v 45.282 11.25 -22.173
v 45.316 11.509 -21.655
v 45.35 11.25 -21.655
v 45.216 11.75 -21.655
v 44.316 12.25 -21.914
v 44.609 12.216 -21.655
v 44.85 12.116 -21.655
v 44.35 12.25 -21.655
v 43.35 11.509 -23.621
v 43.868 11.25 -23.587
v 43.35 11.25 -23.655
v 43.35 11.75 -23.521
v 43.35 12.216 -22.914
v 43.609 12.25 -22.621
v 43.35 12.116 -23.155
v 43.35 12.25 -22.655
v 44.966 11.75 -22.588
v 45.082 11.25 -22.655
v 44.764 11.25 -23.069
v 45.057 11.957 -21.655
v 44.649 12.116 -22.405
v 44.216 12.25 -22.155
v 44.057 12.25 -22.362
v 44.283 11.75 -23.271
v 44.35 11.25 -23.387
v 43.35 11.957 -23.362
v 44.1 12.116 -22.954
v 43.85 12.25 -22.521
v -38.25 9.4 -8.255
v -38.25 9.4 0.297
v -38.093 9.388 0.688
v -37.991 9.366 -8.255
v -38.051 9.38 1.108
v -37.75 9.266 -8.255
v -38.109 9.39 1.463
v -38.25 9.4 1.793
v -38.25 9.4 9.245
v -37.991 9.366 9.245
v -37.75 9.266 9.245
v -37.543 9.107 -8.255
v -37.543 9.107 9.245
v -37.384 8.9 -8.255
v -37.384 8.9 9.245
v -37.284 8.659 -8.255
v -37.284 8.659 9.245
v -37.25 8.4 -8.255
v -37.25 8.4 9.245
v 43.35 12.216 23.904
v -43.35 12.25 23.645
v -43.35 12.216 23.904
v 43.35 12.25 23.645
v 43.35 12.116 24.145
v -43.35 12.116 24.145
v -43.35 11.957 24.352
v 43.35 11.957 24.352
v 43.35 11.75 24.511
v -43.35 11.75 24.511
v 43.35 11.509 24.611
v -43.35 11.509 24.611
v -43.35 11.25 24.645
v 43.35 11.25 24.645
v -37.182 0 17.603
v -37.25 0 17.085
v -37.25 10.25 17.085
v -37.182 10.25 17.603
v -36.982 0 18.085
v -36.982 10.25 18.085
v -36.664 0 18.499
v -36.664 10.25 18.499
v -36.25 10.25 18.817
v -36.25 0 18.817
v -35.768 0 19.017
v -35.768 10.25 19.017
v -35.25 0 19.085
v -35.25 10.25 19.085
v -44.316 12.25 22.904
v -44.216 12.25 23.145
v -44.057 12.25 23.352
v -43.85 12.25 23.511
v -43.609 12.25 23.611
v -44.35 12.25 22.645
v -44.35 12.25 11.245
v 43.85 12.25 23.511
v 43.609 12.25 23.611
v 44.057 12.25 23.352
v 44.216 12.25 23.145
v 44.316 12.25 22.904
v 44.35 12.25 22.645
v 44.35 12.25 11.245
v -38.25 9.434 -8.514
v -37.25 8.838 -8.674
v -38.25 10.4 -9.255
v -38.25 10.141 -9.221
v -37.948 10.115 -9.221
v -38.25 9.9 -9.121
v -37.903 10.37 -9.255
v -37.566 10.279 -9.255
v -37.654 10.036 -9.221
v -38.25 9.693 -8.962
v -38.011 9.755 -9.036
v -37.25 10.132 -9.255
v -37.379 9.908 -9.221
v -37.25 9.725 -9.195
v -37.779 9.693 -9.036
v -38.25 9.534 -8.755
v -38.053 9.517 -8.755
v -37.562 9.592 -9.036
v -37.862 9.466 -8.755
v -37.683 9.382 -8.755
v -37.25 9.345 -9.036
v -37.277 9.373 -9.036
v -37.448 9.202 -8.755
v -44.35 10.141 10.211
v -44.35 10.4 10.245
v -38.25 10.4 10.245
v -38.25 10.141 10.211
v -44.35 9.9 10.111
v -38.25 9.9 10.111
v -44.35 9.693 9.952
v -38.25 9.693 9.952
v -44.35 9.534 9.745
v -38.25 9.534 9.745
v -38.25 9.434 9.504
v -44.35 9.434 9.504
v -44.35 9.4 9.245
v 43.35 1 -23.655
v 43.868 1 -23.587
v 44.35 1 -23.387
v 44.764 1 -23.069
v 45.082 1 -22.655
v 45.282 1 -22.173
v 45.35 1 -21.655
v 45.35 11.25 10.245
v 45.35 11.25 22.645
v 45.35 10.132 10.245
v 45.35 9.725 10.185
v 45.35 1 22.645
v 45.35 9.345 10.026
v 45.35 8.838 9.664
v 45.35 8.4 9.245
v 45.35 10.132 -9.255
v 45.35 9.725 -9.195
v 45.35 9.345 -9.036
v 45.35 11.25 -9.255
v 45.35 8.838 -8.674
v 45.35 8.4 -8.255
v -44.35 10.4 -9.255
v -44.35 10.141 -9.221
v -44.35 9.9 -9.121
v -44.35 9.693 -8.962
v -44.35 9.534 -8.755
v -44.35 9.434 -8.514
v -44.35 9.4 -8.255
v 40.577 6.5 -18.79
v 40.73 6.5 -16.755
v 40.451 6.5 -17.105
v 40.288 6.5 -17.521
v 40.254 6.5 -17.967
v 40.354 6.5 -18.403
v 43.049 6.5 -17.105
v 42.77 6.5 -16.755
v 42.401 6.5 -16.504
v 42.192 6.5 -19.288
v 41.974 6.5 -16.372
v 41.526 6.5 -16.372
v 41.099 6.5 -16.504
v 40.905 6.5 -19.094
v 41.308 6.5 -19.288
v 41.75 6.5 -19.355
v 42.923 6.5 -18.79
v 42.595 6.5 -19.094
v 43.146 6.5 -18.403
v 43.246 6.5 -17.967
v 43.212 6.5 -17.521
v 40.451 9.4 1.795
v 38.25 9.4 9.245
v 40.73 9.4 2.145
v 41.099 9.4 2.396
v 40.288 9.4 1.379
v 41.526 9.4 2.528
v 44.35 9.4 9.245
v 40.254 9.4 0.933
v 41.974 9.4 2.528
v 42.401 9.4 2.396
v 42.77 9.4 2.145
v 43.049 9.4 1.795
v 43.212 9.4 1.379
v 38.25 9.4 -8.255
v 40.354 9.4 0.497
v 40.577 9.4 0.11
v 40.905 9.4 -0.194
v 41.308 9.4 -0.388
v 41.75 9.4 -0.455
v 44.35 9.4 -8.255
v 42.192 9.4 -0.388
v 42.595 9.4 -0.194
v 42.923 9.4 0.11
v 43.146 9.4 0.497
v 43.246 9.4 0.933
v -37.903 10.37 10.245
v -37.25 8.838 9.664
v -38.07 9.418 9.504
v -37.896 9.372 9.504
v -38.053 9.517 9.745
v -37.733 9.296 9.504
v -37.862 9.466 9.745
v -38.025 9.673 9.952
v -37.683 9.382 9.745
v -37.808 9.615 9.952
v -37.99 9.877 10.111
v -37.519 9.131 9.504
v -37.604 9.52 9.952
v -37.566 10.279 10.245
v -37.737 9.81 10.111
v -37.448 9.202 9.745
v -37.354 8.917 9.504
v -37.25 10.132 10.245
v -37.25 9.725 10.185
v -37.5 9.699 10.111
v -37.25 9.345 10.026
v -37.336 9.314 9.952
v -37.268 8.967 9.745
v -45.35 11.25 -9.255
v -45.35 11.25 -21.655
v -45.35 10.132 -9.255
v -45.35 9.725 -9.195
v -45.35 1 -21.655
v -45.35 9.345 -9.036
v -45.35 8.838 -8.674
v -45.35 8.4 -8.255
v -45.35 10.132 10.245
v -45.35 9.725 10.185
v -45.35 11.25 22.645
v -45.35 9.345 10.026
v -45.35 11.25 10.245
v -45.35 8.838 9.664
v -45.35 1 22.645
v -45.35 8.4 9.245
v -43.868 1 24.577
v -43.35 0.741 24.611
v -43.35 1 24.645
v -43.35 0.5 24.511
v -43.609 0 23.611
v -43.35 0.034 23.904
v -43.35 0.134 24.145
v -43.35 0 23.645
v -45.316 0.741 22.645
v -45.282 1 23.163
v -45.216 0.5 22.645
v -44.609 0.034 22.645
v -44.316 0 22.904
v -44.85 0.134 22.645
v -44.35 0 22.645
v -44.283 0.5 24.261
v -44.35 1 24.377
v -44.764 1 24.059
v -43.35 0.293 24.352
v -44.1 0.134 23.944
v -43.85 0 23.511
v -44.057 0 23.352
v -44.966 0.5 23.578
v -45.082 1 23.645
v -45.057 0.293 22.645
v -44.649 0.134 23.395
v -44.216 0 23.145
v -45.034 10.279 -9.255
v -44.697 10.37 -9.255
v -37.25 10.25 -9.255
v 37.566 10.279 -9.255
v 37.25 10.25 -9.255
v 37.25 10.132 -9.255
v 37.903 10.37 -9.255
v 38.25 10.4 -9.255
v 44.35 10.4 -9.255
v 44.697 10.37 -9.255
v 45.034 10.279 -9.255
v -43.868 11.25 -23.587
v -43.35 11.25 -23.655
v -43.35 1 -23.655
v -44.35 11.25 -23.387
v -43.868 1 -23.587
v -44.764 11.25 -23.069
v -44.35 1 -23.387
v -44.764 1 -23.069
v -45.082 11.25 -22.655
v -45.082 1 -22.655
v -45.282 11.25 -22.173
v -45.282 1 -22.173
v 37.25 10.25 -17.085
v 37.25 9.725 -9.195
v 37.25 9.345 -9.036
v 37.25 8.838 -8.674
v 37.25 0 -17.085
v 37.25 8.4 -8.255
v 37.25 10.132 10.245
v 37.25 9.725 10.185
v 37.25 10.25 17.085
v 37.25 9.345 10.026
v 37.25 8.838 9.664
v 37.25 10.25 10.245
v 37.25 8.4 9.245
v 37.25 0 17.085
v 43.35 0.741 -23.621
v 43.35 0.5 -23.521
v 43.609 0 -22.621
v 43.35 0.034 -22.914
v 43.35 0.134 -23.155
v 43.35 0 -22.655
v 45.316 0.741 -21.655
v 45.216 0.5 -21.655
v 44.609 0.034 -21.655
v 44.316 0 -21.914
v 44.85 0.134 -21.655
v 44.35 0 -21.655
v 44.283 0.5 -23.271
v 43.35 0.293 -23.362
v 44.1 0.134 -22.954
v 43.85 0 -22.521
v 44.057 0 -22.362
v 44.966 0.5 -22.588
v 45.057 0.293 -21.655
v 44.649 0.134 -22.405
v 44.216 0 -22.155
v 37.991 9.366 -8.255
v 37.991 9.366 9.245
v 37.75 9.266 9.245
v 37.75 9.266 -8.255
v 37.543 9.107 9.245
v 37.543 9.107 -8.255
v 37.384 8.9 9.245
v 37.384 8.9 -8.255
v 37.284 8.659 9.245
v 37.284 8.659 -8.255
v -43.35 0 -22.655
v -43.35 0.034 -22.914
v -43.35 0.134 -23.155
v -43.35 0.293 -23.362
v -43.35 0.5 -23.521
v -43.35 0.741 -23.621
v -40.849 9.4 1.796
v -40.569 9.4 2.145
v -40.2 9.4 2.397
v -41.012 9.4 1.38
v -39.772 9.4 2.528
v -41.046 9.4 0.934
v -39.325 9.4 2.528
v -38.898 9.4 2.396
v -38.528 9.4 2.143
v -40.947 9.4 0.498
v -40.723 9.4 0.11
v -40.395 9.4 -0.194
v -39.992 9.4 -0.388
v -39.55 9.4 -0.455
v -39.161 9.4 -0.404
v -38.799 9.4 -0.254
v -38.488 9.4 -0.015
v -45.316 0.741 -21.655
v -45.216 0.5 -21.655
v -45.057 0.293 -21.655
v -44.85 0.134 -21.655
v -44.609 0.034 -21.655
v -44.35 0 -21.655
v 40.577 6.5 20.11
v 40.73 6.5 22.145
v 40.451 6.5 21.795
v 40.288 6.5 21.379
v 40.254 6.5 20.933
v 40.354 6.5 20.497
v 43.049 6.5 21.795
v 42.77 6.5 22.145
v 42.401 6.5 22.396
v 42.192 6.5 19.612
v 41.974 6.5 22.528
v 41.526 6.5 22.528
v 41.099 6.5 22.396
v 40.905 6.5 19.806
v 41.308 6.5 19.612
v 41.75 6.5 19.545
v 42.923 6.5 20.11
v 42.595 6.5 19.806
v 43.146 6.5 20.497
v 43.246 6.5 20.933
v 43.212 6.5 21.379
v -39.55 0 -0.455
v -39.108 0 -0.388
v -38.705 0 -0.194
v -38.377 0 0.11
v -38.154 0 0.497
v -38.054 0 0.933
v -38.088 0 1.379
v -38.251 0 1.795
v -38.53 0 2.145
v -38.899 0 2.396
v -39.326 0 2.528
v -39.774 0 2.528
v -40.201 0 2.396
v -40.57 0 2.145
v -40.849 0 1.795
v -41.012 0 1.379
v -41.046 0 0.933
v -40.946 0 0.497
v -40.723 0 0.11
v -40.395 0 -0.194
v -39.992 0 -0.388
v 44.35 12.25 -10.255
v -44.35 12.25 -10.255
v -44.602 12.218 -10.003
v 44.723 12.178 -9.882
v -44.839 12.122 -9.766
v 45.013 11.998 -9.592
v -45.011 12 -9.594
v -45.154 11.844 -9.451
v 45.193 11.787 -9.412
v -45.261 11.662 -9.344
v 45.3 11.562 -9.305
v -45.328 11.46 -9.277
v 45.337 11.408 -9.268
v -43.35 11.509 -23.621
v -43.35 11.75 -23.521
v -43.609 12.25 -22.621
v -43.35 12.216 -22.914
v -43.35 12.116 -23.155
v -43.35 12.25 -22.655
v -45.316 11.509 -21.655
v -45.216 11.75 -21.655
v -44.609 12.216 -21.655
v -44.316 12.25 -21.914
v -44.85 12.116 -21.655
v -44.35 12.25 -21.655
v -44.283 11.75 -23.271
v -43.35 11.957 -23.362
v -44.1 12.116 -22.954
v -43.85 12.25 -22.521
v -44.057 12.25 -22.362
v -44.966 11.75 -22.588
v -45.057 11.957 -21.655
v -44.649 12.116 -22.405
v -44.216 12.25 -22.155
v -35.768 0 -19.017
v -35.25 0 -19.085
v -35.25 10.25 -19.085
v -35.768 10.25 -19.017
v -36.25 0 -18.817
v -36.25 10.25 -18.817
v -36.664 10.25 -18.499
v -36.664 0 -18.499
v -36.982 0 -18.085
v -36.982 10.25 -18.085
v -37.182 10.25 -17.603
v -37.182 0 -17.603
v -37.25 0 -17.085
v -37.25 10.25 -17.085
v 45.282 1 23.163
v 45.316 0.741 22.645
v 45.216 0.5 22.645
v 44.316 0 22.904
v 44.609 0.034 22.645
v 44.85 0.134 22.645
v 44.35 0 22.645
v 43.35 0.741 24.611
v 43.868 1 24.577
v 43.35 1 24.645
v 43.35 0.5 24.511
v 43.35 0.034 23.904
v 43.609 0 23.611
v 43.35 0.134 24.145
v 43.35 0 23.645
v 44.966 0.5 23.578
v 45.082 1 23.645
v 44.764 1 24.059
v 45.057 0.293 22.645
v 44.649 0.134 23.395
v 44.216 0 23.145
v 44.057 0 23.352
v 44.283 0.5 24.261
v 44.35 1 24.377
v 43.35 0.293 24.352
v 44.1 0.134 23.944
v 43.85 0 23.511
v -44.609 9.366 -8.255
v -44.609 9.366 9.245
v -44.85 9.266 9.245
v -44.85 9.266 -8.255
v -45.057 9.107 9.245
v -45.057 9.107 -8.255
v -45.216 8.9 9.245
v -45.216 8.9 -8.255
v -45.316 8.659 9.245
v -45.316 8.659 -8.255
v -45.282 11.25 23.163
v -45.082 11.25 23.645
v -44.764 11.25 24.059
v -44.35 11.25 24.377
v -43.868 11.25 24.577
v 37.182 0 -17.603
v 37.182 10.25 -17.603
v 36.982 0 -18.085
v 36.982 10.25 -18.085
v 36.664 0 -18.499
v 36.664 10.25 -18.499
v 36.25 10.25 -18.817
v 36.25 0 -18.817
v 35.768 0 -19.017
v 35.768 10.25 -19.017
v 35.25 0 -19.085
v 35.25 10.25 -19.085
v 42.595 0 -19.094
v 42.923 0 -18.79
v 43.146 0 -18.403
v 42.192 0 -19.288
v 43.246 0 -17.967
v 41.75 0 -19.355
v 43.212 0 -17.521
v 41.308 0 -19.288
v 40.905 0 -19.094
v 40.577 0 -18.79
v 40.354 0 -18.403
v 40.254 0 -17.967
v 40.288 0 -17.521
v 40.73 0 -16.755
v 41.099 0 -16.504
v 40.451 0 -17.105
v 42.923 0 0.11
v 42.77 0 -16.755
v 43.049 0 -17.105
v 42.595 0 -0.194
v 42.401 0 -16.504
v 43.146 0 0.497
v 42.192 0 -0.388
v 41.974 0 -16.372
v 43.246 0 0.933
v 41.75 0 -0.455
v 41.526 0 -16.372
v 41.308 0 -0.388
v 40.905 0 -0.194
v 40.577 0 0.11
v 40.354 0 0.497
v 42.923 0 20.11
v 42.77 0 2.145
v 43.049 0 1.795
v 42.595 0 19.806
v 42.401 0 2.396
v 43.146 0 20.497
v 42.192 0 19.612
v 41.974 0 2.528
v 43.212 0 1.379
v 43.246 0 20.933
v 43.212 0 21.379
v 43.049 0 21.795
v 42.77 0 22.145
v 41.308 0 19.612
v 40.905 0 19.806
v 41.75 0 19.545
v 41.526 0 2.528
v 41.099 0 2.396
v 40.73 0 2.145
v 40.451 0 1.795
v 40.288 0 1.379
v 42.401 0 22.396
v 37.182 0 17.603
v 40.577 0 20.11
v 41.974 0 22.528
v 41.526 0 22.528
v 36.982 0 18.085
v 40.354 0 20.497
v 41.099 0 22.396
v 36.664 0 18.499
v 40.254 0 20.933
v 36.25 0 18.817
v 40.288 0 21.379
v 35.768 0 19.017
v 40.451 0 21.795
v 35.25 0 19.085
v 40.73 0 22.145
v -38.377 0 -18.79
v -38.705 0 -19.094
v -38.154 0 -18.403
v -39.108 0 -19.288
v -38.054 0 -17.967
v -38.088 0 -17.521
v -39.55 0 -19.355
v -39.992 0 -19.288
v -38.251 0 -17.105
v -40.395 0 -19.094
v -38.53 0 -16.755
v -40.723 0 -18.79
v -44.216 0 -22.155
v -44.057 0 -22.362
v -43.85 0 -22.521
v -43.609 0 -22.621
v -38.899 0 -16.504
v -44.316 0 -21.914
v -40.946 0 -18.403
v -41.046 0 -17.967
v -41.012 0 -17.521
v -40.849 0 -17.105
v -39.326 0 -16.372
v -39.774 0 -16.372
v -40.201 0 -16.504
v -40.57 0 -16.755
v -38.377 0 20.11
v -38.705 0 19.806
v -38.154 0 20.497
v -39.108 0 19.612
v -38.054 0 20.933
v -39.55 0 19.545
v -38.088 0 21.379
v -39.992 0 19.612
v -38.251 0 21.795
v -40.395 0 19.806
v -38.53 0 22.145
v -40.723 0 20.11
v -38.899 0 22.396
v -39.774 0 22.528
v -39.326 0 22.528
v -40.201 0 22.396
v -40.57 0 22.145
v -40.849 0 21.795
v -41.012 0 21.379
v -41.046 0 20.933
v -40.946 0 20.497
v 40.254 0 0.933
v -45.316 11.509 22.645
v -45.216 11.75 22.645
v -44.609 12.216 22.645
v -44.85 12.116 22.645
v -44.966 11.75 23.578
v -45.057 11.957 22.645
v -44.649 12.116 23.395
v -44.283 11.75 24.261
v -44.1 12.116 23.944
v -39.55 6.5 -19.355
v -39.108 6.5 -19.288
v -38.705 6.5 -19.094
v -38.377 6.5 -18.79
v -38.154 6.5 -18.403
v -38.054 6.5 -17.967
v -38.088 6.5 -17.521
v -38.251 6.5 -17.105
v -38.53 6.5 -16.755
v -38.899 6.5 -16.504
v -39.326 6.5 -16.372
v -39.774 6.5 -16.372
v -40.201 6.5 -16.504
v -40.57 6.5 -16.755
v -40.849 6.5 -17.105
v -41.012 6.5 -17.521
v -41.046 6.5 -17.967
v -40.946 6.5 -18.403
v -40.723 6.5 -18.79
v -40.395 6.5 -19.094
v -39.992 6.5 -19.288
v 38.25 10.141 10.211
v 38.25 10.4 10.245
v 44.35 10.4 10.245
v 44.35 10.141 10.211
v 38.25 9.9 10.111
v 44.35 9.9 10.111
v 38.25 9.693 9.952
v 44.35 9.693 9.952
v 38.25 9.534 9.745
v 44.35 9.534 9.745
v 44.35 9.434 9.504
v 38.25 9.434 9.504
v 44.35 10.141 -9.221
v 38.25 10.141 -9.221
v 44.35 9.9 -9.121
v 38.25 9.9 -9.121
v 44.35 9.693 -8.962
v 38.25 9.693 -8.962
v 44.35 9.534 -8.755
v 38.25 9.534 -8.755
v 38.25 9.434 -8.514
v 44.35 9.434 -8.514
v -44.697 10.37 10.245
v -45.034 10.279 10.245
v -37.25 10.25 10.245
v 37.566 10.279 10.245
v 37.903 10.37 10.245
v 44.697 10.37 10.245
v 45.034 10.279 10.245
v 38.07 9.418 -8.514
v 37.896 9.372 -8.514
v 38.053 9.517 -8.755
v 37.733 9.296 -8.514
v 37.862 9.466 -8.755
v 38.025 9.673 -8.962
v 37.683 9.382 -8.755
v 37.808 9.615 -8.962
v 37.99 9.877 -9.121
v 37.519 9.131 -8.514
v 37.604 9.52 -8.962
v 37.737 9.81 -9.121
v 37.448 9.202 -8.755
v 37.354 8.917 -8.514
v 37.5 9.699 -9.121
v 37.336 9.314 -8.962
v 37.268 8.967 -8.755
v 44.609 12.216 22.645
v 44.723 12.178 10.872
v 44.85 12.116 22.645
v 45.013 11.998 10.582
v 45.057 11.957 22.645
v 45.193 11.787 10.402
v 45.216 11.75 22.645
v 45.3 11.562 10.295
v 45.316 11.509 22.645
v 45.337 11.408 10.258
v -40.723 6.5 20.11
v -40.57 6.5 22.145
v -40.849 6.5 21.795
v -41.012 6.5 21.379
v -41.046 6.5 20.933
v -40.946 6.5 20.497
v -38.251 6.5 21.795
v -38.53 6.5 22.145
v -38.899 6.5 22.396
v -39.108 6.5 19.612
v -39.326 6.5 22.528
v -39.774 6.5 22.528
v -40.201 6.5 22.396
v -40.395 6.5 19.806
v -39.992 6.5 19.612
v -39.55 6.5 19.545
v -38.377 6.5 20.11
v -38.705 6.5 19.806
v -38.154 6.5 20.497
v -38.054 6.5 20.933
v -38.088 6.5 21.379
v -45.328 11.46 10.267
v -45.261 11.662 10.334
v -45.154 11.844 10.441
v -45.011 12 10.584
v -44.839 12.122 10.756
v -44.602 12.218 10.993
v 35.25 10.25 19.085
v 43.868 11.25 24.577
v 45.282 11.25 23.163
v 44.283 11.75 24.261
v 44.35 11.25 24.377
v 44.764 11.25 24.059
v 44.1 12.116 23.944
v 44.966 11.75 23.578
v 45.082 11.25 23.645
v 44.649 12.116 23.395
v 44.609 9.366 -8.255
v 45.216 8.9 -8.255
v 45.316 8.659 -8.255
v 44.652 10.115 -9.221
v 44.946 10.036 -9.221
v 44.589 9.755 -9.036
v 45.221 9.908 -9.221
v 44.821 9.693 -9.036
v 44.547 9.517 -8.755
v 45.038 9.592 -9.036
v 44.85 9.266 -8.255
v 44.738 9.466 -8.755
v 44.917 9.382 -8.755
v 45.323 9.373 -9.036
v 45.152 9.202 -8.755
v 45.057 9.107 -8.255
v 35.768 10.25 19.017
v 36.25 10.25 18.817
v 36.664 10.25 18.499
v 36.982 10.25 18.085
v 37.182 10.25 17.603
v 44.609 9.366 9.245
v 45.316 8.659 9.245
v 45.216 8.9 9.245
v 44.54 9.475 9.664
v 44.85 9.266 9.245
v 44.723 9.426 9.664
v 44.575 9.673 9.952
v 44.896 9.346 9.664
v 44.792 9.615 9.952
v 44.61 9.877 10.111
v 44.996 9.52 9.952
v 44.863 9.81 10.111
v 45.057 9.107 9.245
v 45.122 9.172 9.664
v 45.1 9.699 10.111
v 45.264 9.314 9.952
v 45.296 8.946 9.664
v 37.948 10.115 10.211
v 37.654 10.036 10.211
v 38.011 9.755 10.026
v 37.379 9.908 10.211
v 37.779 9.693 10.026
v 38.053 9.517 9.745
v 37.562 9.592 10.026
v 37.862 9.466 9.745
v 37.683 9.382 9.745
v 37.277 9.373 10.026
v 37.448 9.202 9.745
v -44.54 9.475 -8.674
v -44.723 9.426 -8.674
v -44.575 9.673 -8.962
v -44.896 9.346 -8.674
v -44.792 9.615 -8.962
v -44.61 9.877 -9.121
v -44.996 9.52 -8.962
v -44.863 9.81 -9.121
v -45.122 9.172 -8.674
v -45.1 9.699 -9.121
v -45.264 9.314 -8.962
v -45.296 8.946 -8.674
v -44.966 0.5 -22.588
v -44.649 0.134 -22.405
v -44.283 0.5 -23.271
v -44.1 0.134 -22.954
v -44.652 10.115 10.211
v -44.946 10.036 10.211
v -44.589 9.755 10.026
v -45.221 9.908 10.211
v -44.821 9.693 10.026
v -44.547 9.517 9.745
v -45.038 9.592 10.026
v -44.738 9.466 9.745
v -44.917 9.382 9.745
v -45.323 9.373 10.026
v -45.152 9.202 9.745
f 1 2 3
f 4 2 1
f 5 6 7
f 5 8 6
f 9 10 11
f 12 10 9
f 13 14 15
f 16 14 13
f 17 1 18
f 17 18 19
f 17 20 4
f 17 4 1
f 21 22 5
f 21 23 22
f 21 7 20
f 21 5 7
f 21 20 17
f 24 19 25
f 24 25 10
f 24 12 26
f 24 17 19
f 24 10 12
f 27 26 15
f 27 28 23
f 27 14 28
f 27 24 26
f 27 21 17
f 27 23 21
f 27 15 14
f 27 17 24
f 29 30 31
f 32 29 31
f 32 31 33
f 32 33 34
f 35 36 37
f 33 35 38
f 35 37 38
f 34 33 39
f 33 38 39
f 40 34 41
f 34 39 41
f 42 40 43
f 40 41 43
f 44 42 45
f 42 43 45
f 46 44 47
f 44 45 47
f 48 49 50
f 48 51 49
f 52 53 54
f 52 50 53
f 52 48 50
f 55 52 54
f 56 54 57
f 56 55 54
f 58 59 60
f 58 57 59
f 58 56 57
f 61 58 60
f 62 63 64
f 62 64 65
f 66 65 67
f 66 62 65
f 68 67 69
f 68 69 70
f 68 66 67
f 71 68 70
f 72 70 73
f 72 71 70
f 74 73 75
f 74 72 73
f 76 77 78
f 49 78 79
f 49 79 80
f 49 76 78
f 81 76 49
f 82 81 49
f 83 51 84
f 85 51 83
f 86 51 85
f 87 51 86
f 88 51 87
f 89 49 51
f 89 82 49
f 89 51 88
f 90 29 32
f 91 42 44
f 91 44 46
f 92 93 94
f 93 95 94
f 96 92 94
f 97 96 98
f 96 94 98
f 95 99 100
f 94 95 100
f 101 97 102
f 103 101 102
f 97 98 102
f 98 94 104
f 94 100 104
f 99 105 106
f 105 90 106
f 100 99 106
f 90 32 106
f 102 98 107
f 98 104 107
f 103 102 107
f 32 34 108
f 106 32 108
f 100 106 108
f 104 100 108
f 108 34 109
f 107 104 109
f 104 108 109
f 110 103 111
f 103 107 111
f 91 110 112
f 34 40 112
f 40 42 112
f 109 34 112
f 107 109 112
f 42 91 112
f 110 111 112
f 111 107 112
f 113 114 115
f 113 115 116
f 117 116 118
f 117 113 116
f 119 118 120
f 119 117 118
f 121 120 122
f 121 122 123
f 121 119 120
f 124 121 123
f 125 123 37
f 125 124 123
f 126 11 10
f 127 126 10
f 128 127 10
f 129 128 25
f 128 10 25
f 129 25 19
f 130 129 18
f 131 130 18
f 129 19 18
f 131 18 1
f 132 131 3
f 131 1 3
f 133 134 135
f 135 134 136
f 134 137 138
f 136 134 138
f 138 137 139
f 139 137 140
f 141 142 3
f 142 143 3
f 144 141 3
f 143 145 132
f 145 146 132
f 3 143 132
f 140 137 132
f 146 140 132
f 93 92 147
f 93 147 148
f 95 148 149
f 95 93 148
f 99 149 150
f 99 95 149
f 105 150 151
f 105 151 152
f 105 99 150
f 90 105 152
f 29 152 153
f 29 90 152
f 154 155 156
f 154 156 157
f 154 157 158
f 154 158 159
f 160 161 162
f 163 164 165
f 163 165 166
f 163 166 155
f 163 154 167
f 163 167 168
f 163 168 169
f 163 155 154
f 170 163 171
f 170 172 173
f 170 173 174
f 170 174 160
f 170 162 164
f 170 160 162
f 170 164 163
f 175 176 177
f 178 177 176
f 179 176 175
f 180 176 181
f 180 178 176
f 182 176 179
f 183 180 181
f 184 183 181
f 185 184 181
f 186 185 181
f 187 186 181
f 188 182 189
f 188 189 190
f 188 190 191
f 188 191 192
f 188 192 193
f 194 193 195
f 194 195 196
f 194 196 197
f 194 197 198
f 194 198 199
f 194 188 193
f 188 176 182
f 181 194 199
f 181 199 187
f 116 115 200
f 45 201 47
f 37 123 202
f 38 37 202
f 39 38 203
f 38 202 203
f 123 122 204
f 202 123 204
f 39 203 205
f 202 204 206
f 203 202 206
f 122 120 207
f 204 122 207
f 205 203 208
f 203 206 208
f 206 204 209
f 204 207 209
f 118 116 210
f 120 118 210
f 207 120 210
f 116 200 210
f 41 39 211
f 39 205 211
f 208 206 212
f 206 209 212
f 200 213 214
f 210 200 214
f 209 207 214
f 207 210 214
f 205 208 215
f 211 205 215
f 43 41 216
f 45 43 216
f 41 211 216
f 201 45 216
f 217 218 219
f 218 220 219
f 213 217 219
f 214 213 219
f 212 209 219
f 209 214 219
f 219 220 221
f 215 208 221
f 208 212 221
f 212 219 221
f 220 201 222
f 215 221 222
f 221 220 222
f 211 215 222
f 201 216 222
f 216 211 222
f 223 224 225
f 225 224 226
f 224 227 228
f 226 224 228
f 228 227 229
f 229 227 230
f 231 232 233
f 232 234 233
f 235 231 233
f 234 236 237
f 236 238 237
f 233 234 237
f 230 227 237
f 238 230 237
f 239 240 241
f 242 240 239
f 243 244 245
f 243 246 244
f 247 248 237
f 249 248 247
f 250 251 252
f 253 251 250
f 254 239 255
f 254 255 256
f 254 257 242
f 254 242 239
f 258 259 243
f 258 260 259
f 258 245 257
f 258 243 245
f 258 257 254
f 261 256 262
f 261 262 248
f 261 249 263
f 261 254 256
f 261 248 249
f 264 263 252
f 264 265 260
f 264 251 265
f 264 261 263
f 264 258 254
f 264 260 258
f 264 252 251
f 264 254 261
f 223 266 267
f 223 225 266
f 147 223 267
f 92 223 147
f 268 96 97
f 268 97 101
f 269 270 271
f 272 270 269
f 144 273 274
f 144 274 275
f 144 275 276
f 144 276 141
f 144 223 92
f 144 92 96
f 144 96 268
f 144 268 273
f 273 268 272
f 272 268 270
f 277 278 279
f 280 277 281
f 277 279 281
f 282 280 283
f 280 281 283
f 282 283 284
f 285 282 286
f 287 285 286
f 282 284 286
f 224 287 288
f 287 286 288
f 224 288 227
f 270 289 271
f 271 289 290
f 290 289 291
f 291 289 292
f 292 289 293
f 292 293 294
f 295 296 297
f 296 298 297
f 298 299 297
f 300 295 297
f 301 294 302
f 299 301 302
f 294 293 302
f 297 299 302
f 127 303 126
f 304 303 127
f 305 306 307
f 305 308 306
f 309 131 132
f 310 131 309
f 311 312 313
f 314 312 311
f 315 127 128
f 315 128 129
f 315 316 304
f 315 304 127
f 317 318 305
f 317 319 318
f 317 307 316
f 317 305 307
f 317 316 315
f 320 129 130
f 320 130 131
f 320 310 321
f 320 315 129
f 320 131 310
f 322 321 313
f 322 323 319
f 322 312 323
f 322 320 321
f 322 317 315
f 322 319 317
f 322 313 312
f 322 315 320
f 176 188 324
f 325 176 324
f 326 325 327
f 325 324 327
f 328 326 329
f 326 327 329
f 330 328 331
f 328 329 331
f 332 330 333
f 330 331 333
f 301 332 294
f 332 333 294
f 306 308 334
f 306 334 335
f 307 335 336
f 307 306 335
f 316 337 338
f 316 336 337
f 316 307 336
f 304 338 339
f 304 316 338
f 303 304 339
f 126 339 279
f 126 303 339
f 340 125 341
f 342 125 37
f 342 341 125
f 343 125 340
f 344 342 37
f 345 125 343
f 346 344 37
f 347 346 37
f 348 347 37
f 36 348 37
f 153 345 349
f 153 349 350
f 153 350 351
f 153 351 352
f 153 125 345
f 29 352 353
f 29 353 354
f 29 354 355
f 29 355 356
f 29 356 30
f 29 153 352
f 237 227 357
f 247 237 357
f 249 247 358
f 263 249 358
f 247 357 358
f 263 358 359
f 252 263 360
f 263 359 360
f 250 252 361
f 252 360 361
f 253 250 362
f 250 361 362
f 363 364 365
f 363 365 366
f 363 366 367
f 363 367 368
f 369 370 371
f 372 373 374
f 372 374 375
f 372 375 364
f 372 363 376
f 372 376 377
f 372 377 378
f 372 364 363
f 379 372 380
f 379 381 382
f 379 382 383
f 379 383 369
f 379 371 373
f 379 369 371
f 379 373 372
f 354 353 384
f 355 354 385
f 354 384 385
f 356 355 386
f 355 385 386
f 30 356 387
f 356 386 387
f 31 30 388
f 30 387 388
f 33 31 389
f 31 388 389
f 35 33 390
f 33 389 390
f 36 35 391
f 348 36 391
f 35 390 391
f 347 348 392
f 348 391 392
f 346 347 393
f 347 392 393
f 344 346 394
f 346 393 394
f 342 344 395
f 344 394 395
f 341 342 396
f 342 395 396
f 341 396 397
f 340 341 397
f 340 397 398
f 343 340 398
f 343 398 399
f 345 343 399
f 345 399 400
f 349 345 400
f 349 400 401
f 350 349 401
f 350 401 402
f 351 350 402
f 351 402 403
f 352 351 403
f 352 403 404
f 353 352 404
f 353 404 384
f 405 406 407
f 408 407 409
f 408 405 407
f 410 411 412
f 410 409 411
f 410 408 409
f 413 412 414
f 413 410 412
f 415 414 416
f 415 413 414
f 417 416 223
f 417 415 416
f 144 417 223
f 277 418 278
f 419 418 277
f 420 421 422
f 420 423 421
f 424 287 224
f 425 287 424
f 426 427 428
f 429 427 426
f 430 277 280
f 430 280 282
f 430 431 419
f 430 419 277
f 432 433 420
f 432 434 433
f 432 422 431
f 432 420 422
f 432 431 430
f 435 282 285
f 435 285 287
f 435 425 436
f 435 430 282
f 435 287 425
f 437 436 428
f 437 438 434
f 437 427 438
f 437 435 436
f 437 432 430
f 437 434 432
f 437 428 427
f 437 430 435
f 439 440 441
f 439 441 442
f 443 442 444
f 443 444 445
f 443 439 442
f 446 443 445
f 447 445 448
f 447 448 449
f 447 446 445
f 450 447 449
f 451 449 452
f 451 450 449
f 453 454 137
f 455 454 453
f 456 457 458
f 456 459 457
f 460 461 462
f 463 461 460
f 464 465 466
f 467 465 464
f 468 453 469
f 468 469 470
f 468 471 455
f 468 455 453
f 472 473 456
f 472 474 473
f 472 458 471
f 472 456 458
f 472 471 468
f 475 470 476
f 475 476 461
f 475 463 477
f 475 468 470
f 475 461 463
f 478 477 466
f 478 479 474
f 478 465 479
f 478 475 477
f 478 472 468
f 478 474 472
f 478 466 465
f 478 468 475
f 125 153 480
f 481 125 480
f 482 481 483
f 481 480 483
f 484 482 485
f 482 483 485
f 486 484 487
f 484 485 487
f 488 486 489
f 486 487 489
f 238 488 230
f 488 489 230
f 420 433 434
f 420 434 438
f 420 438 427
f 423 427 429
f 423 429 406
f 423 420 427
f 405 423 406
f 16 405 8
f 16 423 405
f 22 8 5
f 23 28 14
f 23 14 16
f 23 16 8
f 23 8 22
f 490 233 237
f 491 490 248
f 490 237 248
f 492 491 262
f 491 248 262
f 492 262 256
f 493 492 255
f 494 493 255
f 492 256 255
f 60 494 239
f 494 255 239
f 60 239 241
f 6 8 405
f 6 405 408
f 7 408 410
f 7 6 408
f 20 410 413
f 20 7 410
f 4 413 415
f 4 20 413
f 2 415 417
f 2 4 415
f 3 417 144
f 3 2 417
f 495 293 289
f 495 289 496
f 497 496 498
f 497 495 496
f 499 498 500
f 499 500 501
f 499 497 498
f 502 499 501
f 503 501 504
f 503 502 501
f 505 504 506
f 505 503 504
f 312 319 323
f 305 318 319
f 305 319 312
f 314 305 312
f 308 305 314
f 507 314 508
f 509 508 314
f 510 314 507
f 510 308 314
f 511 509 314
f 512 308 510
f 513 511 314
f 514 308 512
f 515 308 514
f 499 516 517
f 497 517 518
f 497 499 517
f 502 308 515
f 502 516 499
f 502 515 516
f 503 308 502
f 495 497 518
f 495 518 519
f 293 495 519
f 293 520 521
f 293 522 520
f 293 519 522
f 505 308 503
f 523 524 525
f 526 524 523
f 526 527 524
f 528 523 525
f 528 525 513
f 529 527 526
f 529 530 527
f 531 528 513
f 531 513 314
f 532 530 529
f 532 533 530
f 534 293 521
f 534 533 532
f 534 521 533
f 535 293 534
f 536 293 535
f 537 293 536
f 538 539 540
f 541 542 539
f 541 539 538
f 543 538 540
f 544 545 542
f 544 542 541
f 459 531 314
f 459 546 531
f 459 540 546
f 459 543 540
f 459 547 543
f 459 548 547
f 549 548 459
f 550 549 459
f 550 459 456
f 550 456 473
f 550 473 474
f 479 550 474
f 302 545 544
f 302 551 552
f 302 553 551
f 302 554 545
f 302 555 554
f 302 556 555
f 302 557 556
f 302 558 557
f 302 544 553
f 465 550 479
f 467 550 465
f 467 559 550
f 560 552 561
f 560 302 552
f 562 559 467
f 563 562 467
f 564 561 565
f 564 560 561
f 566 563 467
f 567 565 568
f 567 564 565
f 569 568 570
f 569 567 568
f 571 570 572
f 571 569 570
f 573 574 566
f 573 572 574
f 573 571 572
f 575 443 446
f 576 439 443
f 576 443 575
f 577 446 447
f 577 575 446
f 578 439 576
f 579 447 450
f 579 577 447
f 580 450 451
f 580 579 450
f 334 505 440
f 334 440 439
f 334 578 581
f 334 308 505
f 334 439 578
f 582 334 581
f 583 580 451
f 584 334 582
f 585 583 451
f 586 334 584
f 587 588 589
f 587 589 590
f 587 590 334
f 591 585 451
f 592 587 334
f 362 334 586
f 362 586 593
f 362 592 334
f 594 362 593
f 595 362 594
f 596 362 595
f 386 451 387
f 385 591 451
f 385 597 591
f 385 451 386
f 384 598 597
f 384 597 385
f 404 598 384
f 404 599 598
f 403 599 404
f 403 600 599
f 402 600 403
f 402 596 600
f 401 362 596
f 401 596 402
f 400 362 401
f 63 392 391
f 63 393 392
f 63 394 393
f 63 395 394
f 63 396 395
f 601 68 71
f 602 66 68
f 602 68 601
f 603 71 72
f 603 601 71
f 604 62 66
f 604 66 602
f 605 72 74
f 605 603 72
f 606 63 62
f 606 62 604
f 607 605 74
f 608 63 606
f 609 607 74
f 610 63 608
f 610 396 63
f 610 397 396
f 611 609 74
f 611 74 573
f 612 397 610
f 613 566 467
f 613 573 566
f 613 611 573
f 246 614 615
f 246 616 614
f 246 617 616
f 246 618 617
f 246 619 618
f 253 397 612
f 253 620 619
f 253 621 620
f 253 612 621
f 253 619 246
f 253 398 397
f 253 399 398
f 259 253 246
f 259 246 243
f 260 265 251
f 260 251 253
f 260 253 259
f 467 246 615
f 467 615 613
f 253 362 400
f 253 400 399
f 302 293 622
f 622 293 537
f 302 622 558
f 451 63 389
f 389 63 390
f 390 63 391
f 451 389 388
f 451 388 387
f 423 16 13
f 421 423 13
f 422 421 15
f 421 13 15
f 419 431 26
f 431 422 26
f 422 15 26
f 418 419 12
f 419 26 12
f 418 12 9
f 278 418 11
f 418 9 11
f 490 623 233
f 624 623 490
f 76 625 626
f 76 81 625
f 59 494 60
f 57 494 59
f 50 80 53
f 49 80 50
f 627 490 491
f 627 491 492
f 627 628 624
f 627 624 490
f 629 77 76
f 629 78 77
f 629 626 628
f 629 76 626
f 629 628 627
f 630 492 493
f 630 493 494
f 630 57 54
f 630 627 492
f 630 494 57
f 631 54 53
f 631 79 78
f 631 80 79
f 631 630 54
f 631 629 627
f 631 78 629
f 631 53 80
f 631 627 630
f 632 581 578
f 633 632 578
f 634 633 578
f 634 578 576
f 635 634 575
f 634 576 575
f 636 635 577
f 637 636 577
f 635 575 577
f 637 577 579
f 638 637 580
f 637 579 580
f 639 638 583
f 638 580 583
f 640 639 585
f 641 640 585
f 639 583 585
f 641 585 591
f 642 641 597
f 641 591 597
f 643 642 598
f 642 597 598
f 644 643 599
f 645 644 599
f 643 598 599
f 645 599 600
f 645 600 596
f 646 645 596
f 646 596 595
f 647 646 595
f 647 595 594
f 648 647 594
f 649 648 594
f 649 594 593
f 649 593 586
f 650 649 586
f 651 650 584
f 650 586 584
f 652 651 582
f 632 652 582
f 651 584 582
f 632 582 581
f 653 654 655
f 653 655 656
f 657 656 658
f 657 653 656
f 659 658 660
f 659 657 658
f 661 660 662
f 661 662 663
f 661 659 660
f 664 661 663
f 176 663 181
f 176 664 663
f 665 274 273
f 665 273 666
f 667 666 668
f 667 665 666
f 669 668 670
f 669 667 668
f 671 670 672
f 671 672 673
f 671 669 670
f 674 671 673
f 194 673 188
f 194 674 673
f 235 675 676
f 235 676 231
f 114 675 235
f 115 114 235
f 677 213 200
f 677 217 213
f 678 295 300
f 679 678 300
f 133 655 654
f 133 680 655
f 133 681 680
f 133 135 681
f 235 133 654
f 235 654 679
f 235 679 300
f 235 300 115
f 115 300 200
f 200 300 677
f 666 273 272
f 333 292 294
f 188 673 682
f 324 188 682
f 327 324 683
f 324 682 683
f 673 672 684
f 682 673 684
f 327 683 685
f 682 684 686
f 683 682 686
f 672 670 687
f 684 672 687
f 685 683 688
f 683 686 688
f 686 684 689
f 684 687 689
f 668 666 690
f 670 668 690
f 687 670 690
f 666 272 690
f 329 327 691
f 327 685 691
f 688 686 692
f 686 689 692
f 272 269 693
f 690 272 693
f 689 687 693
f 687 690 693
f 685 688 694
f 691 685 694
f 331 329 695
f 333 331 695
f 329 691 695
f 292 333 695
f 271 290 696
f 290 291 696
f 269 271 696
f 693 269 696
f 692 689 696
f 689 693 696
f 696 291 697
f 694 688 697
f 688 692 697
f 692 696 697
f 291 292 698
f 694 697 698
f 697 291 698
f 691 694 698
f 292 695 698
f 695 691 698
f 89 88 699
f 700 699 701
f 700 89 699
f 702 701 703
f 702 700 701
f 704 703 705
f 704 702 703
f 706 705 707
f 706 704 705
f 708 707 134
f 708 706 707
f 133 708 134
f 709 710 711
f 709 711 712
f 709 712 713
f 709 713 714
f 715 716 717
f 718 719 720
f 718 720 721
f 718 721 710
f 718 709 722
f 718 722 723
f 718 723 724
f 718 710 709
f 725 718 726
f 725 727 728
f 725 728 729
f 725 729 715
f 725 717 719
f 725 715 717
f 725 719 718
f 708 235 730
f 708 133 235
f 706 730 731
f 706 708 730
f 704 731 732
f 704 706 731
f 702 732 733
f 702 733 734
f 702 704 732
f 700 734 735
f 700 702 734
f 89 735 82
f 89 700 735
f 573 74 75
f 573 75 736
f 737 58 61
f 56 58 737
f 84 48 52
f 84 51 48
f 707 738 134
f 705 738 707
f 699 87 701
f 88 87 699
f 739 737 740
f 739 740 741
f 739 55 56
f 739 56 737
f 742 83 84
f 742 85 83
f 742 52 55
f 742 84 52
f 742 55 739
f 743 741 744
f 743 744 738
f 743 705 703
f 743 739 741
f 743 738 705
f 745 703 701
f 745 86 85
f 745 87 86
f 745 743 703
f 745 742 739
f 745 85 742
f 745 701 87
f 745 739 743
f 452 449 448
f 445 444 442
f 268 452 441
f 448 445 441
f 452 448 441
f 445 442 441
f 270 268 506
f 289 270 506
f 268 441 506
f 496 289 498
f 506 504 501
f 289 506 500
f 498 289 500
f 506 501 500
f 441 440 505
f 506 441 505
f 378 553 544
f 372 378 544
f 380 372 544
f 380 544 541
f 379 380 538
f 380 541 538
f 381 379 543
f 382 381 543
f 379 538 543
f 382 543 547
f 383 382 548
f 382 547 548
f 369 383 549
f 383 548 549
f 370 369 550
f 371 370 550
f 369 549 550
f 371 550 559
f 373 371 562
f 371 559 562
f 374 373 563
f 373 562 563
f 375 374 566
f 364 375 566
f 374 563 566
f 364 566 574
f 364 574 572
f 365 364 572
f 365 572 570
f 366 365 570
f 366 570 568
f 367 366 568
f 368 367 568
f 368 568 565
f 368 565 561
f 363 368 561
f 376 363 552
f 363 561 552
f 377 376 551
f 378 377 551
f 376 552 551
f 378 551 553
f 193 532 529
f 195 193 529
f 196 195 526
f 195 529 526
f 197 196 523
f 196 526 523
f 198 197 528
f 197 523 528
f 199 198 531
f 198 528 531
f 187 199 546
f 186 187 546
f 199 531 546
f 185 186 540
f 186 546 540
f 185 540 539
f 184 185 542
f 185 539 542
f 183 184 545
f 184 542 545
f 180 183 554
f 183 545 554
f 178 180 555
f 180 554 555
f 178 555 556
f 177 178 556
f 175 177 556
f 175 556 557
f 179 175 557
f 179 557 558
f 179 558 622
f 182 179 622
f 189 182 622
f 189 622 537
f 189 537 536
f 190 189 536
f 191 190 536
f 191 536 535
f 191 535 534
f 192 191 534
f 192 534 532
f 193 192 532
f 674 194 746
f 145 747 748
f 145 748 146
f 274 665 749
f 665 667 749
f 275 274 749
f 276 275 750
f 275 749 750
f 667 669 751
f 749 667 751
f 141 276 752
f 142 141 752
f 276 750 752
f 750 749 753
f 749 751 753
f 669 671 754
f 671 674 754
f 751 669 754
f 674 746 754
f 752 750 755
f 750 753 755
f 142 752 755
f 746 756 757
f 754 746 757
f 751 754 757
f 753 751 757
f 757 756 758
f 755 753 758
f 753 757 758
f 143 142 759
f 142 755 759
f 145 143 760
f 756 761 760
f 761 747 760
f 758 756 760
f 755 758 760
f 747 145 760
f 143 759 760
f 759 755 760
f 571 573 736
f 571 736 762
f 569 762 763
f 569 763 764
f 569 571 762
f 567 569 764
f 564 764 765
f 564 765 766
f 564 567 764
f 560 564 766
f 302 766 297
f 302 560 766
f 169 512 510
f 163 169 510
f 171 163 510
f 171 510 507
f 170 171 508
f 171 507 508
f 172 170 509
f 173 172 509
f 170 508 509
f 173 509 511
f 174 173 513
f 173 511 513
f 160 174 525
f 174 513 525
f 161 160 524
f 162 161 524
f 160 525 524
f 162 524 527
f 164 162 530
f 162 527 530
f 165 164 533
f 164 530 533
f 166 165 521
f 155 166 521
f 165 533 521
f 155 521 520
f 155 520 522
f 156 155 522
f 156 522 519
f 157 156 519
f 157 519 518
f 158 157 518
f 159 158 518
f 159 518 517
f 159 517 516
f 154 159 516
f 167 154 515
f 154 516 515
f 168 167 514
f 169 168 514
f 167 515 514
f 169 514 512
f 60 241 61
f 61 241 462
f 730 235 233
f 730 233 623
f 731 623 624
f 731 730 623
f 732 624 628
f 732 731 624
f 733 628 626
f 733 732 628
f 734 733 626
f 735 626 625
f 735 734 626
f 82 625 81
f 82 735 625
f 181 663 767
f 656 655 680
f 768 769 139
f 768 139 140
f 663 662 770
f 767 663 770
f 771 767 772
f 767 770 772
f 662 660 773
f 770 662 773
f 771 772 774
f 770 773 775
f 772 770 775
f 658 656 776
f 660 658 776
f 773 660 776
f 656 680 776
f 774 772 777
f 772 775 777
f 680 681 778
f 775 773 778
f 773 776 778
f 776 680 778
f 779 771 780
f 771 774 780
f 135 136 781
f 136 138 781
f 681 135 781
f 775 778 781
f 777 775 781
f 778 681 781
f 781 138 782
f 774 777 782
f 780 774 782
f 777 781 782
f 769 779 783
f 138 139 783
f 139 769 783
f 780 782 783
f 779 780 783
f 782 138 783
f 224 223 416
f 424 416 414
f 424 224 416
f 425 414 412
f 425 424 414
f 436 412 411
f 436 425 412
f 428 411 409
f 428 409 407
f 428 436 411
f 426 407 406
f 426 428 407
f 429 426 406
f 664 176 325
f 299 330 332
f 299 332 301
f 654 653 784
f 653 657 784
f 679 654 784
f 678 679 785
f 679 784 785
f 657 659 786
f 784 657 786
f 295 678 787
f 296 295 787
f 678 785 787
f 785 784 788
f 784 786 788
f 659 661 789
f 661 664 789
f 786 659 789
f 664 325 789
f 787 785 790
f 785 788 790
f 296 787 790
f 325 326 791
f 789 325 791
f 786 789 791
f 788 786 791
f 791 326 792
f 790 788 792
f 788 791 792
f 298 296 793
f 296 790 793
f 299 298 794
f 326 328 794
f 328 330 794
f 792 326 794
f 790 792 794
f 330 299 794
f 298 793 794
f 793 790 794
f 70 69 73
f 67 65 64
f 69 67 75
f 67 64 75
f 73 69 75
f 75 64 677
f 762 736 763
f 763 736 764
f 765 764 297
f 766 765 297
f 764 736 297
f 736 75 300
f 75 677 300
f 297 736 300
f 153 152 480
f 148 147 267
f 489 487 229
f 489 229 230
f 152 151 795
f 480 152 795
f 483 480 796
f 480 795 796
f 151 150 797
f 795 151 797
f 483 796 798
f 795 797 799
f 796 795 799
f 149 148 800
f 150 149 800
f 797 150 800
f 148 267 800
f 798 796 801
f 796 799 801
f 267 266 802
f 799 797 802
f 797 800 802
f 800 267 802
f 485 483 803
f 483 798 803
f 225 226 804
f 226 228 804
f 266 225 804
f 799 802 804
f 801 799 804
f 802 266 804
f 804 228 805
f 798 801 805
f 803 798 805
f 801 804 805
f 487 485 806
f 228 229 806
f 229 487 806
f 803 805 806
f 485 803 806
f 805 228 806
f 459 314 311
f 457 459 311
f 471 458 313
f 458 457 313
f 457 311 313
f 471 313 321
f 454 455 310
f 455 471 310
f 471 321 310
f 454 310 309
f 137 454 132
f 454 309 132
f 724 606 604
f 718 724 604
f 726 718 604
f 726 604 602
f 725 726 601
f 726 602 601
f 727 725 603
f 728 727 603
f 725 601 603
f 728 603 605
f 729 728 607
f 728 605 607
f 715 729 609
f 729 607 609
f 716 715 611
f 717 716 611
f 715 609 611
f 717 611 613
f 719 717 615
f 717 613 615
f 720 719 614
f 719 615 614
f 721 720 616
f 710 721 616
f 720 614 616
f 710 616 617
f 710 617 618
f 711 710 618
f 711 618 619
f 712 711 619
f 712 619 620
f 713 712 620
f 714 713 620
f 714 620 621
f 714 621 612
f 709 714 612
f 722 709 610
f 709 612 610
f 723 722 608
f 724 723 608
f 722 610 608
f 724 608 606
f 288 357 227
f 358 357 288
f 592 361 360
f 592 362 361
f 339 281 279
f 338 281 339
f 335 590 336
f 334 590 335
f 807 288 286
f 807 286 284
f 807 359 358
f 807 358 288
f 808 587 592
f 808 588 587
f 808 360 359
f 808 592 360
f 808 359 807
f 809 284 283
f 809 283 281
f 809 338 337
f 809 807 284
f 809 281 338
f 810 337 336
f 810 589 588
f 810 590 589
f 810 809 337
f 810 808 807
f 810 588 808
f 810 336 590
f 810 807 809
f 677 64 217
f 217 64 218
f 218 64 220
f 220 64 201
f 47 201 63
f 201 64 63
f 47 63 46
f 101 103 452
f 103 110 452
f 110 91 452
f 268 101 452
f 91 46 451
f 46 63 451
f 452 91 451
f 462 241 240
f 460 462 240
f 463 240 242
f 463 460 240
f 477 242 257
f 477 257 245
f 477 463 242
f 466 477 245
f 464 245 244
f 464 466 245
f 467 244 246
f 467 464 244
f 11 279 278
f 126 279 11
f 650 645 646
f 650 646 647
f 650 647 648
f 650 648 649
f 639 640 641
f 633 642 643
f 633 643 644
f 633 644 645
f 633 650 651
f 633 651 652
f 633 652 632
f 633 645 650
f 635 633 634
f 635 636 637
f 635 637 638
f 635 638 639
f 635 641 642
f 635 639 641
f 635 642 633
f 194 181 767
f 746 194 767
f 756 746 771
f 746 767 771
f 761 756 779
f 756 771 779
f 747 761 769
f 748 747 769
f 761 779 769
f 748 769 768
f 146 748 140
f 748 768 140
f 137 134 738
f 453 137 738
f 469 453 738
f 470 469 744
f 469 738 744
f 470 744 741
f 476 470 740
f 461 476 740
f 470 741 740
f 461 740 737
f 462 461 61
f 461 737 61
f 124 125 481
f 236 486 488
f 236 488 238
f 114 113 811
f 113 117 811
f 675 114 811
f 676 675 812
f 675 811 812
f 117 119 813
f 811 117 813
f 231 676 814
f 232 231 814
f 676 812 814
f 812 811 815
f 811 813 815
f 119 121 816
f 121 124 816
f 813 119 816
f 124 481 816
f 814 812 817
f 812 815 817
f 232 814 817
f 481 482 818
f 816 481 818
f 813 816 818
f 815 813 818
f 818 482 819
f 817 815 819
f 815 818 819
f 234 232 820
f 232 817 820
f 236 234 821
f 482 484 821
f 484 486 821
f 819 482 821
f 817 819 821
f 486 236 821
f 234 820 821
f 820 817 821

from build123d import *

# Parameters (mm, degrees)
SKETCH1_W           = 90.7
SKETCH1_H           = 48.3
SKETCH1_W_2         = 74.5
SKETCH1_H_2         = 38.17
BOSS_EXTRUDE1_DEPTH = 12.25
SKETCH2_W           = 90.7
SKETCH2_H           = 14.4
BOSS_EXTRUDE2_DEPTH = 2
SKETCH3_W           = 8.1
SKETCH3_H           = 19.5
CUT_EXTRUDE1_DEPTH  = 2.85
SKETCH4_R           = 1.5
CUT_EXTRUDE2_DEPTH  = 6.5
SKETCH5_R           = 1.5
CUT_EXTRUDE3_DEPTH  = 54.047724032
FILLET7_R           = 1
FILLET4_R           = 2
FILLET5_R           = 1
FILLET8_R           = 1


with BuildPart() as part:
    # Sketch1 → Boss-Extrude1 (new body)
    with BuildSketch(Plane(origin=(0, 0, 0), x_dir=(1, 0, 0), z_dir=(0, 1, 0))):
        with Locations((0, -0.495)):
            Rectangle(SKETCH1_W, SKETCH1_H)
        Rectangle(SKETCH1_W_2, SKETCH1_H_2, mode=Mode.SUBTRACT)
    extrude(amount=BOSS_EXTRUDE1_DEPTH)

    # Sketch2 → Boss-Extrude2 (add)
    with BuildSketch(Plane(origin=(0, 12.25, 0), x_dir=(1, 0, 0), z_dir=(0, 1, 0))):
        with Locations((0, 16.455)):
            Rectangle(SKETCH2_W, SKETCH2_H)
        with Locations((0, -17.445)):
            Rectangle(SKETCH2_W, SKETCH2_H)
    extrude(amount=-BOSS_EXTRUDE2_DEPTH)

    # Sketch3 → Cut-Extrude1 (cut)
    with BuildSketch(Plane(origin=(0, 12.25, 0), x_dir=(1, 0, 0), z_dir=(0, 1, 0))):
        with Locations((-41.3, -0.495)):
            Rectangle(SKETCH3_W, SKETCH3_H)
        with Locations((41.3, -0.495)):
            Rectangle(SKETCH3_W, SKETCH3_H)
    extrude(amount=-CUT_EXTRUDE1_DEPTH, mode=Mode.SUBTRACT)

    # Sketch4 → Cut-Extrude2 (cut)
    with BuildSketch(Plane.XZ):
        with Locations(Location((-39.55, 21.045, 0), (0, 0, 270))):
            Circle(SKETCH4_R)
        with Locations(Location((41.75, 21.045, 0), (0, 0, 270))):
            Circle(SKETCH4_R)
        with Locations(Location((41.75, -17.855, 0), (0, 0, 270))):
            Circle(SKETCH4_R)
        with Locations(Location((-39.55, -17.855, 0), (0, 0, 270))):
            Circle(SKETCH4_R)
    extrude(amount=-CUT_EXTRUDE2_DEPTH, mode=Mode.SUBTRACT)

    # Sketch5 → Cut-Extrude3 (cut, through all)
    with BuildSketch(Plane.XZ):
        with Locations(Location((-39.55, 1.045, 0), (0, 0, 270))):
            Circle(SKETCH5_R)
        with Locations(Location((41.75, 1.045, 0), (0, 0, 270))):
            Circle(SKETCH5_R)
    extrude(amount=-CUT_EXTRUDE3_DEPTH, mode=Mode.SUBTRACT)

    # Fillet7
    fillet7_edges = [part.edges().sort_by_distance(p)[0] for p in [
        (45.35, 12.25, 17.445),
        (0, 12.25, -23.655),
        (-45.35, 12.25, -16.455),
        (0, 0, -23.655),
        (0, 12.25, -9.255),
        (45.35, 0, 0.495),
        (0, 0, 24.645),
        (0, 12.25, 10.245),
        (-45.35, 0, 0.495),
        (45.35, 12.25, -16.455),
        (-45.35, 12.25, 17.445),
        (0, 12.25, 24.645),
    ]]
    fillet(fillet7_edges, radius=FILLET7_R)

    # Fillet4
    # the kernel refuses this fillet: 2 mm, written as the material it adds along each edge
    with BuildSketch(Plane(origin=(-37.25, 0, 19.085), x_dir=(0, 0, -1), z_dir=(0, 1, 0)), Plane(origin=(37.25, 0, -19.085), x_dir=(0, 0, 1), z_dir=(0, 1, 0))) as fillet4_piece_1:
        with BuildLine():
            CenterArc((FILLET4_R, -FILLET4_R), FILLET4_R, 90, 90)
            Line((0, -FILLET4_R), (0, 0))
            Line((0, 0), (FILLET4_R, 0))
        make_face()
    extrude(amount=10.25)
    with BuildSketch(Plane(origin=(37.25, 0, 19.085), x_dir=(0, 0, -1), z_dir=(0, 1, 0)), Plane(origin=(-37.25, 0, -19.085), x_dir=(0, 0, 1), z_dir=(0, 1, 0))) as fillet4_piece_2:
        with BuildLine():
            CenterArc((FILLET4_R, FILLET4_R), FILLET4_R, 180, 90)
            Line((0, FILLET4_R), (0, 0))
            Line((0, 0), (FILLET4_R, 0))
        make_face()
    extrude(amount=10.25)
    # the kernel refuses this fillet: 2 mm, written as the material it takes off along each edge
    with BuildSketch(Plane(origin=(-43.35, 12.25, 22.645), x_dir=(-1, 0, 0), z_dir=(0, 0, -1))) as fillet4_2_piece_1:
        with BuildLine():
            CenterArc((1, -1), 1, 0, 90)
            Line((2, -1), (2, 0))
            Line((2, 0), (1, 0))
        make_face()
    revolve(axis=Axis((-43.35, 12.25, 22.645), (0, 1, 0)), revolution_arc=90, mode=Mode.SUBTRACT)
    with BuildSketch(Plane(origin=(43.35, 12.25, 22.645), x_dir=(0, 0, 1), z_dir=(-1, 0, 0))) as fillet4_2_piece_2:
        with BuildLine():
            CenterArc((1, -1), 1, 0, 90)
            Line((2, -1), (2, 0))
            Line((2, 0), (1, 0))
        make_face()
    revolve(axis=Axis((43.35, 12.25, 22.645), (0, 1, 0)), revolution_arc=90, mode=Mode.SUBTRACT)
    with BuildSketch(Plane(origin=(-43.35, 12.25, -21.655), x_dir=(0, 0, -1), z_dir=(1, 0, 0))) as fillet4_2_piece_3:
        with BuildLine():
            CenterArc((1, -1), 1, 0, 90)
            Line((2, -1), (2, 0))
            Line((2, 0), (1, 0))
        make_face()
    revolve(axis=Axis((-43.35, 12.25, -21.655), (0, 1, 0)), revolution_arc=90, mode=Mode.SUBTRACT)
    with BuildSketch(Plane(origin=(43.35, 12.25, -21.655), x_dir=(1, 0, 0), z_dir=(0, 0, 1))) as fillet4_2_piece_4:
        with BuildLine():
            CenterArc((1, -1), 1, 0, 90)
            Line((2, -1), (2, 0))
            Line((2, 0), (1, 0))
        make_face()
    revolve(axis=Axis((43.35, 12.25, -21.655), (0, 1, 0)), revolution_arc=90, mode=Mode.SUBTRACT)
    with BuildSketch(Plane(origin=(-43.35, 0, -21.655), x_dir=(-1, 0, 0), z_dir=(0, 0, 1))) as fillet4_2_piece_5:
        with BuildLine():
            CenterArc((1, -1), 1, 0, 90)
            Line((2, -1), (2, 0))
            Line((2, 0), (1, 0))
        make_face()
    revolve(axis=Axis((-43.35, 0, -21.655), (0, -1, 0)), revolution_arc=90, mode=Mode.SUBTRACT)
    with BuildSketch(Plane(origin=(43.35, 0, -21.655), x_dir=(0, 0, -1), z_dir=(-1, 0, 0))) as fillet4_2_piece_6:
        with BuildLine():
            CenterArc((1, -1), 1, 0, 90)
            Line((2, -1), (2, 0))
            Line((2, 0), (1, 0))
        make_face()
    revolve(axis=Axis((43.35, 0, -21.655), (0, -1, 0)), revolution_arc=90, mode=Mode.SUBTRACT)
    with BuildSketch(Plane(origin=(-43.35, 0, 22.645), x_dir=(0, 0, 1), z_dir=(1, 0, 0))) as fillet4_2_piece_7:
        with BuildLine():
            CenterArc((1, -1), 1, 0, 90)
            Line((2, -1), (2, 0))
            Line((2, 0), (1, 0))
        make_face()
    revolve(axis=Axis((-43.35, 0, 22.645), (0, -1, 0)), revolution_arc=90, mode=Mode.SUBTRACT)
    with BuildSketch(Plane(origin=(43.35, 0, 22.645), x_dir=(1, 0, 0), z_dir=(0, 0, -1))) as fillet4_2_piece_8:
        with BuildLine():
            CenterArc((1, -1), 1, 0, 90)
            Line((2, -1), (2, 0))
            Line((2, 0), (1, 0))
        make_face()
    revolve(axis=Axis((43.35, 0, 22.645), (0, -1, 0)), revolution_arc=90, mode=Mode.SUBTRACT)
    with BuildSketch(Plane(origin=(45.35, 12.25, 24.645), x_dir=(0, 0, -1), z_dir=(0, -1, 0)), Plane(origin=(45.35, 12.25, -23.655), x_dir=(-1, 0, 0), z_dir=(0, -1, 0)), Plane(origin=(-45.35, 0, 24.645), x_dir=(0, 0, -1), z_dir=(0, 1, 0)), Plane(origin=(-45.35, 0, -23.655), x_dir=(1, 0, 0), z_dir=(0, 1, 0))) as fillet4_2_piece_9:
        with BuildLine():
            CenterArc((FILLET4_R, -FILLET4_R), FILLET4_R, 90, 90)
            Line((0, -FILLET4_R), (0, 0))
            Line((0, 0), (FILLET4_R, 0))
        make_face()
    extrude(amount=12.25, mode=Mode.SUBTRACT)

    # Fillet5
    # the kernel refuses this fillet: 1 mm, written as the material it takes off along each edge
    with BuildSketch(Plane(origin=(-45.35, 9.4, -9.255), x_dir=(0, -1, 0), z_dir=(0, 0, 1)), Plane(origin=(-37.25, 9.4, 10.245), x_dir=(0, -1, 0), z_dir=(0, 0, -1)), Plane(origin=(37.25, 9.4, -9.255), x_dir=(0, -1, 0), z_dir=(0, 0, 1))) as fillet5_piece_1:
        with BuildLine():
            CenterArc((FILLET5_R, FILLET5_R), FILLET5_R, 180, 90)
            Line((0, FILLET5_R), (0, 0))
            Line((0, 0), (FILLET5_R, 0))
        make_face()
    extrude(amount=19.5, mode=Mode.SUBTRACT)
    with BuildSketch(Plane(origin=(45.35, 9.4, 10.245), x_dir=(-1, 0, 0), z_dir=(0, 0, -1))) as fillet5_piece_2:
        with BuildLine():
            CenterArc((FILLET5_R, -FILLET5_R), FILLET5_R, 90, 90)
            Line((0, -FILLET5_R), (0, 0))
            Line((0, 0), (FILLET5_R, 0))
        make_face()
    extrude(amount=19.5, mode=Mode.SUBTRACT)

    # Fillet8
    # the kernel refuses this fillet: 1 mm, written as the material it adds along each edge
    with BuildSketch(Plane(origin=(44.35, 9.4, -9.255), x_dir=(0, 1, 0), z_dir=(-1, 0, 0)), Plane(origin=(38.25, 9.4, 10.245), x_dir=(0, 1, 0), z_dir=(1, 0, 0)), Plane(origin=(-44.35, 9.4, 10.245), x_dir=(0, 1, 0), z_dir=(1, 0, 0)), Plane(origin=(-38.25, 9.4, -9.255), x_dir=(0, 1, 0), z_dir=(-1, 0, 0))) as fillet8_piece_1:
        with BuildLine():
            CenterArc((FILLET8_R, -FILLET8_R), FILLET8_R, 90, 90)
            Line((0, -FILLET8_R), (0, 0))
            Line((0, 0), (FILLET8_R, 0))
        make_face()
    extrude(amount=6.1)
    with BuildSketch(Plane(origin=(44.35, 8.4, -9.255), x_dir=(0, 1, 0), z_dir=(-1, 0, 0))) as fillet8_piece_2_section:
        with BuildLine():
            CenterArc((1 + FILLET8_R, -FILLET8_R), FILLET8_R, 90, 90)
            Line((1, -FILLET8_R), (1, 0))
            Line((1, 0), (1 + FILLET8_R, 0))
        make_face()
    fillet8_piece_2 = revolve(axis=Axis((44.35, 8.4, -9.255), (0, 0, -1)), revolution_arc=233.296989237, mode=Mode.PRIVATE)
    fillet8_piece_2 = split(fillet8_piece_2, bisect_by=Plane(origin=(45.35, 9.619775247, -9.087699795), z_dir=(-1, 0, 0)), keep=Keep.TOP, mode=Mode.PRIVATE)
    add(fillet8_piece_2)
    with BuildSketch(Plane(origin=(44.35, 8.4, 10.245), x_dir=(0, 1, 0), z_dir=(-1, 0, 0))) as fillet8_piece_3_section:
        with BuildLine():
            CenterArc((1 + FILLET8_R, FILLET8_R), FILLET8_R, 180, 90)
            Line((1, FILLET8_R), (1, 0))
            Line((1, 0), (1 + FILLET8_R, 0))
        make_face()
    fillet8_piece_3 = revolve(axis=Axis((44.35, 8.4, 10.245), (0, 0, -1)), revolution_arc=233.296989237, mode=Mode.PRIVATE)
    fillet8_piece_3 = split(fillet8_piece_3, bisect_by=Plane(origin=(45.35, 9.619775247, 10.077699795), z_dir=(-1, 0, 0)), keep=Keep.TOP, mode=Mode.PRIVATE)
    add(fillet8_piece_3)
    with BuildSketch(Plane(origin=(38.25, 8.4, 10.245), x_dir=(0, 1, 0), z_dir=(1, 0, 0))) as fillet8_piece_4_section:
        with BuildLine():
            CenterArc((1 + FILLET8_R, -FILLET8_R), FILLET8_R, 90, 90)
            Line((1, -FILLET8_R), (1, 0))
            Line((1, 0), (1 + FILLET8_R, 0))
        make_face()
    fillet8_piece_4 = revolve(axis=Axis((38.25, 8.4, 10.245), (0, 0, 1)), revolution_arc=233.296989237, mode=Mode.PRIVATE)
    fillet8_piece_4 = split(fillet8_piece_4, bisect_by=Plane(origin=(37.25, 9.619775248, 10.077699795), z_dir=(1, 0, 0)), keep=Keep.TOP, mode=Mode.PRIVATE)
    add(fillet8_piece_4)
    with BuildSketch(Plane(origin=(38.25, 8.4, -9.255), x_dir=(0, 1, 0), z_dir=(1, 0, 0))) as fillet8_piece_5_section:
        with BuildLine():
            CenterArc((1 + FILLET8_R, FILLET8_R), FILLET8_R, 180, 90)
            Line((1, FILLET8_R), (1, 0))
            Line((1, 0), (1 + FILLET8_R, 0))
        make_face()
    fillet8_piece_5 = revolve(axis=Axis((38.25, 8.4, -9.255), (0, 0, 1)), revolution_arc=233.296989237, mode=Mode.PRIVATE)
    fillet8_piece_5 = split(fillet8_piece_5, bisect_by=Plane(origin=(37.25, 9.619775248, -9.087699795), z_dir=(1, 0, 0)), keep=Keep.TOP, mode=Mode.PRIVATE)
    add(fillet8_piece_5)
    with BuildSketch(Plane(origin=(-38.25, 8.4, -9.255), x_dir=(0, 1, 0), z_dir=(-1, 0, 0))) as fillet8_piece_6_section:
        with BuildLine():
            CenterArc((1 + FILLET8_R, -FILLET8_R), FILLET8_R, 90, 90)
            Line((1, -FILLET8_R), (1, 0))
            Line((1, 0), (1 + FILLET8_R, 0))
        make_face()
    fillet8_piece_6 = revolve(axis=Axis((-38.25, 8.4, -9.255), (0, 0, -1)), revolution_arc=233.296989237, mode=Mode.PRIVATE)
    fillet8_piece_6 = split(fillet8_piece_6, bisect_by=Plane(origin=(-37.25, 9.619775247, -9.087699795), z_dir=(-1, 0, 0)), keep=Keep.TOP, mode=Mode.PRIVATE)
    add(fillet8_piece_6)
    with BuildSketch(Plane(origin=(-38.25, 8.4, 10.245), x_dir=(0, 1, 0), z_dir=(-1, 0, 0))) as fillet8_piece_7_section:
        with BuildLine():
            CenterArc((1 + FILLET8_R, FILLET8_R), FILLET8_R, 180, 90)
            Line((1, FILLET8_R), (1, 0))
            Line((1, 0), (1 + FILLET8_R, 0))
        make_face()
    fillet8_piece_7 = revolve(axis=Axis((-38.25, 8.4, 10.245), (0, 0, -1)), revolution_arc=233.296989237, mode=Mode.PRIVATE)
    fillet8_piece_7 = split(fillet8_piece_7, bisect_by=Plane(origin=(-37.25, 9.619775247, 10.077699795), z_dir=(-1, 0, 0)), keep=Keep.TOP, mode=Mode.PRIVATE)
    add(fillet8_piece_7)
    with BuildSketch(Plane(origin=(-44.35, 8.4, 10.245), x_dir=(0, 1, 0), z_dir=(1, 0, 0))) as fillet8_piece_8_section:
        with BuildLine():
            CenterArc((1 + FILLET8_R, -FILLET8_R), FILLET8_R, 90, 90)
            Line((1, -FILLET8_R), (1, 0))
            Line((1, 0), (1 + FILLET8_R, 0))
        make_face()
    fillet8_piece_8 = revolve(axis=Axis((-44.35, 8.4, 10.245), (0, 0, 1)), revolution_arc=233.296989237, mode=Mode.PRIVATE)
    fillet8_piece_8 = split(fillet8_piece_8, bisect_by=Plane(origin=(-45.35, 9.619775248, 10.077699795), z_dir=(1, 0, 0)), keep=Keep.TOP, mode=Mode.PRIVATE)
    add(fillet8_piece_8)
    with BuildSketch(Plane(origin=(-44.35, 8.4, -9.255), x_dir=(0, 1, 0), z_dir=(1, 0, 0))) as fillet8_piece_9_section:
        with BuildLine():
            CenterArc((1 + FILLET8_R, FILLET8_R), FILLET8_R, 180, 90)
            Line((1, FILLET8_R), (1, 0))
            Line((1, 0), (1 + FILLET8_R, 0))
        make_face()
    fillet8_piece_9 = revolve(axis=Axis((-44.35, 8.4, -9.255), (0, 0, 1)), revolution_arc=233.296989237, mode=Mode.PRIVATE)
    fillet8_piece_9 = split(fillet8_piece_9, bisect_by=Plane(origin=(-45.35, 9.619775248, -9.087699795), z_dir=(1, 0, 0)), keep=Keep.TOP, mode=Mode.PRIVATE)
    add(fillet8_piece_9)


solid = part.part
